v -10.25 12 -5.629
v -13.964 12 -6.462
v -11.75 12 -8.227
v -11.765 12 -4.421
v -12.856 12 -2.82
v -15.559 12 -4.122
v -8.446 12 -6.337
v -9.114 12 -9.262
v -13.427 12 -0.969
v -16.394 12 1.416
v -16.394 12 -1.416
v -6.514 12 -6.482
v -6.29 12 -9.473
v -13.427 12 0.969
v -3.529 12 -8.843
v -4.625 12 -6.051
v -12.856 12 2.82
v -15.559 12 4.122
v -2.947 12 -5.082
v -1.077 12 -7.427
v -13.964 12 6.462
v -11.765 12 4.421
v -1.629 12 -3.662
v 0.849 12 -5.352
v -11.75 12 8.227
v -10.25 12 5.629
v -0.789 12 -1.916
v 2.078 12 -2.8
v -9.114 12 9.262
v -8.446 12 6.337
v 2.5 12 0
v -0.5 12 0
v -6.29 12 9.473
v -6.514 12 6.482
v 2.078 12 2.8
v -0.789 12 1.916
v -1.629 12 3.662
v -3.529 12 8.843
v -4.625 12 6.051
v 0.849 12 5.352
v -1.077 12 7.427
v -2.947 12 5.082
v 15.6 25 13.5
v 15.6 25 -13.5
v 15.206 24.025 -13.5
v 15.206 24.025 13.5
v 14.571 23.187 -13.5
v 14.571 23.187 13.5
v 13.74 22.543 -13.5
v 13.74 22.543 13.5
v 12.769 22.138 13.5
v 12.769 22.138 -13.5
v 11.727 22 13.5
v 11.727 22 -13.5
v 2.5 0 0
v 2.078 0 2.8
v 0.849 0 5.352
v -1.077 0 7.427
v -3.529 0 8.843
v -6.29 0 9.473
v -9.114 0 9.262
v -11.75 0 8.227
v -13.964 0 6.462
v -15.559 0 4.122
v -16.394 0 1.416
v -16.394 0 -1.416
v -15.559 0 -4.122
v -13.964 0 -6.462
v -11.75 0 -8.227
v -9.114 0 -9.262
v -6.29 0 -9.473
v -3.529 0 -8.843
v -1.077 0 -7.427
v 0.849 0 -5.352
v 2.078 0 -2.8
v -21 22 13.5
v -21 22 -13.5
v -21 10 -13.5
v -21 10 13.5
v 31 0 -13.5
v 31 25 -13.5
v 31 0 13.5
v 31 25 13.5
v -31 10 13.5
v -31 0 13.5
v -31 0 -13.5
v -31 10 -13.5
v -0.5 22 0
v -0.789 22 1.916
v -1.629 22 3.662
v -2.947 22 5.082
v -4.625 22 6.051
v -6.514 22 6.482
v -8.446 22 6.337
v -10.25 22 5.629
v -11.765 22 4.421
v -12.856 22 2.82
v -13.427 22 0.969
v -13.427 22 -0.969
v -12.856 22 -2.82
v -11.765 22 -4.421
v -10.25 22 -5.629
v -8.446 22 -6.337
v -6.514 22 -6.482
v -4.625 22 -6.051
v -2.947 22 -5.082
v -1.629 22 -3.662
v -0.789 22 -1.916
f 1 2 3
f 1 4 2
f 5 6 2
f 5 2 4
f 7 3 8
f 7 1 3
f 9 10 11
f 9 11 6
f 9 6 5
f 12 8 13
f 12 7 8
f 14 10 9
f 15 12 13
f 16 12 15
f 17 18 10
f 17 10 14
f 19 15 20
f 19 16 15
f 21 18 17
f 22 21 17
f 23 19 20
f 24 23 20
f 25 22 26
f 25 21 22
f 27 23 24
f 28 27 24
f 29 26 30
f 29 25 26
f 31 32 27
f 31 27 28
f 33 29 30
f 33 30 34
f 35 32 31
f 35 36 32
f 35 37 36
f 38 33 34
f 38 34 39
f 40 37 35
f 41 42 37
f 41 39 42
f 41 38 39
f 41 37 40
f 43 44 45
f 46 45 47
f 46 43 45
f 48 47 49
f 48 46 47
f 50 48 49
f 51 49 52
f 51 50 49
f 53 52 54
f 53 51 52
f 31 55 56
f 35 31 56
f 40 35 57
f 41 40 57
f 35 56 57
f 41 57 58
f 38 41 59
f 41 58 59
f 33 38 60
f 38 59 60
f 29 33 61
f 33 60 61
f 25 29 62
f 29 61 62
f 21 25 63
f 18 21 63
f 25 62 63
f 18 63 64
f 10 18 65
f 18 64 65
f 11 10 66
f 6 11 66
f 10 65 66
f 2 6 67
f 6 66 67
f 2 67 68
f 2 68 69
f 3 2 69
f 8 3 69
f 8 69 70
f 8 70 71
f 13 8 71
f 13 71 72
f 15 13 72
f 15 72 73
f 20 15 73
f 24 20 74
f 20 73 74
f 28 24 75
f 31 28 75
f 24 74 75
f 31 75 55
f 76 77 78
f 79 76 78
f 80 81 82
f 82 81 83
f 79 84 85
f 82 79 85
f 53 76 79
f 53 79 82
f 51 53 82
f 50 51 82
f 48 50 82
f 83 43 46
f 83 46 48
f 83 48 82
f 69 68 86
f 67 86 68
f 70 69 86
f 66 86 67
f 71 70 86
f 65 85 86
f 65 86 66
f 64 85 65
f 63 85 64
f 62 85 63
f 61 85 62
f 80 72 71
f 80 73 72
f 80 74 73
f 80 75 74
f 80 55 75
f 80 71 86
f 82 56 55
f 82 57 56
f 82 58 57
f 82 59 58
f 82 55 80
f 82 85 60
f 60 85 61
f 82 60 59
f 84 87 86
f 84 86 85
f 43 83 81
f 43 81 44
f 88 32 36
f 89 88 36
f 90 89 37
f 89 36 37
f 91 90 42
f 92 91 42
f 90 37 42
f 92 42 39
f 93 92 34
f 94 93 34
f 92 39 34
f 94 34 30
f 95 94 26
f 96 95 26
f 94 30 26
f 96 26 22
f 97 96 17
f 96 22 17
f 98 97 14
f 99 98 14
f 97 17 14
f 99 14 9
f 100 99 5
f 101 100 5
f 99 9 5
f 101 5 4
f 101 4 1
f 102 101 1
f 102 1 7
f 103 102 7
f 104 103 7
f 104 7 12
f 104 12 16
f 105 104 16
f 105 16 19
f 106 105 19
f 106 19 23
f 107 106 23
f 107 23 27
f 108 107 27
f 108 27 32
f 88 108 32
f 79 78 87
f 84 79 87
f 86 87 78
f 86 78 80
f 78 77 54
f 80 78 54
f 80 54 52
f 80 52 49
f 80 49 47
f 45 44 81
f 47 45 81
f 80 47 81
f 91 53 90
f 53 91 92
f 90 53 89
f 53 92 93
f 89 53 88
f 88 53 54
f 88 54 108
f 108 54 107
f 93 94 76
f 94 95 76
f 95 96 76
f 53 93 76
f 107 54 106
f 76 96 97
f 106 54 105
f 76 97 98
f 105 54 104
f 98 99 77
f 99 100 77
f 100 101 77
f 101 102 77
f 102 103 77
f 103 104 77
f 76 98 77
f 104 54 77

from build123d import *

# Parameters (mm, degrees)
SKETCH2_W             = 62
SKETCH2_H             = 27
BOSS_EXTRUDE1_DEPTH   = 25
CUT_EXTRUDE1_DEPTH    = 28
SKETCH4_R             = 6.5
CUT_EXTRUDE2_DEPTH    = 26
BODY_MOVE_COPY1_ANGLE = 180
BOSS_EXTRUDE2_DEPTH   = 27
SKETCH6_R             = 9.5
CUT_EXTRUDE3_DEPTH    = 12


with BuildPart() as part:
    # Sketch2 → Boss-Extrude1 (new body)
    with BuildSketch(Plane(origin=(0, 0, 0), x_dir=(1, 0, 0), z_dir=(0, 1, 0))):
        Rectangle(SKETCH2_W, SKETCH2_H)
    extrude(amount=BOSS_EXTRUDE1_DEPTH)

    # Sketch3 → Cut-Extrude1 (cut, through all)
    with BuildSketch(Plane.XY.offset(13.5)):
        Polygon((-31, 0), (23.611888282, 0), (23.611888282, 3), (-21, 3), (-21, 15), (-31, 15), align=None)
    extrude(amount=-CUT_EXTRUDE1_DEPTH, mode=Mode.SUBTRACT)

    # Sketch4 → Cut-Extrude2 (cut, through all)
    with BuildSketch(Plane(origin=(0, 25, 0), x_dir=(1, 0, 0), z_dir=(0, 1, 0))):
        with Locations((-7, 0)):
            Circle(SKETCH4_R)
    extrude(amount=-CUT_EXTRUDE2_DEPTH, mode=Mode.SUBTRACT)


with BuildPart() as part_1:
    # Body-Move/Copy1: moved
    add(part.part.rotate(Axis((0, 12.5, 0), (1, 0, 0)), BODY_MOVE_COPY1_ANGLE))

    # Sketch5 → Boss-Extrude2 (add)
    with BuildSketch(Plane.XY.offset(13.5)):
        with BuildLine():
            Line((23.611888282, 25), (15.6, 25))
            ThreePointArc((15.6, 25), (14.176506397, 22.83772234), (11.727016654, 22))
            Line((11.727016654, 22), (23.611888282, 22))
            Line((23.611888282, 22), (23.611888282, 25))
        make_face()
    extrude(amount=-BOSS_EXTRUDE2_DEPTH)

    # Sketch6 → Cut-Extrude3 (cut)
    with BuildSketch(Plane.XZ):
        with Locations((-7, 0)):
            Circle(SKETCH6_R)
    extrude(amount=-CUT_EXTRUDE3_DEPTH, mode=Mode.SUBTRACT)


solid = part_1.part
